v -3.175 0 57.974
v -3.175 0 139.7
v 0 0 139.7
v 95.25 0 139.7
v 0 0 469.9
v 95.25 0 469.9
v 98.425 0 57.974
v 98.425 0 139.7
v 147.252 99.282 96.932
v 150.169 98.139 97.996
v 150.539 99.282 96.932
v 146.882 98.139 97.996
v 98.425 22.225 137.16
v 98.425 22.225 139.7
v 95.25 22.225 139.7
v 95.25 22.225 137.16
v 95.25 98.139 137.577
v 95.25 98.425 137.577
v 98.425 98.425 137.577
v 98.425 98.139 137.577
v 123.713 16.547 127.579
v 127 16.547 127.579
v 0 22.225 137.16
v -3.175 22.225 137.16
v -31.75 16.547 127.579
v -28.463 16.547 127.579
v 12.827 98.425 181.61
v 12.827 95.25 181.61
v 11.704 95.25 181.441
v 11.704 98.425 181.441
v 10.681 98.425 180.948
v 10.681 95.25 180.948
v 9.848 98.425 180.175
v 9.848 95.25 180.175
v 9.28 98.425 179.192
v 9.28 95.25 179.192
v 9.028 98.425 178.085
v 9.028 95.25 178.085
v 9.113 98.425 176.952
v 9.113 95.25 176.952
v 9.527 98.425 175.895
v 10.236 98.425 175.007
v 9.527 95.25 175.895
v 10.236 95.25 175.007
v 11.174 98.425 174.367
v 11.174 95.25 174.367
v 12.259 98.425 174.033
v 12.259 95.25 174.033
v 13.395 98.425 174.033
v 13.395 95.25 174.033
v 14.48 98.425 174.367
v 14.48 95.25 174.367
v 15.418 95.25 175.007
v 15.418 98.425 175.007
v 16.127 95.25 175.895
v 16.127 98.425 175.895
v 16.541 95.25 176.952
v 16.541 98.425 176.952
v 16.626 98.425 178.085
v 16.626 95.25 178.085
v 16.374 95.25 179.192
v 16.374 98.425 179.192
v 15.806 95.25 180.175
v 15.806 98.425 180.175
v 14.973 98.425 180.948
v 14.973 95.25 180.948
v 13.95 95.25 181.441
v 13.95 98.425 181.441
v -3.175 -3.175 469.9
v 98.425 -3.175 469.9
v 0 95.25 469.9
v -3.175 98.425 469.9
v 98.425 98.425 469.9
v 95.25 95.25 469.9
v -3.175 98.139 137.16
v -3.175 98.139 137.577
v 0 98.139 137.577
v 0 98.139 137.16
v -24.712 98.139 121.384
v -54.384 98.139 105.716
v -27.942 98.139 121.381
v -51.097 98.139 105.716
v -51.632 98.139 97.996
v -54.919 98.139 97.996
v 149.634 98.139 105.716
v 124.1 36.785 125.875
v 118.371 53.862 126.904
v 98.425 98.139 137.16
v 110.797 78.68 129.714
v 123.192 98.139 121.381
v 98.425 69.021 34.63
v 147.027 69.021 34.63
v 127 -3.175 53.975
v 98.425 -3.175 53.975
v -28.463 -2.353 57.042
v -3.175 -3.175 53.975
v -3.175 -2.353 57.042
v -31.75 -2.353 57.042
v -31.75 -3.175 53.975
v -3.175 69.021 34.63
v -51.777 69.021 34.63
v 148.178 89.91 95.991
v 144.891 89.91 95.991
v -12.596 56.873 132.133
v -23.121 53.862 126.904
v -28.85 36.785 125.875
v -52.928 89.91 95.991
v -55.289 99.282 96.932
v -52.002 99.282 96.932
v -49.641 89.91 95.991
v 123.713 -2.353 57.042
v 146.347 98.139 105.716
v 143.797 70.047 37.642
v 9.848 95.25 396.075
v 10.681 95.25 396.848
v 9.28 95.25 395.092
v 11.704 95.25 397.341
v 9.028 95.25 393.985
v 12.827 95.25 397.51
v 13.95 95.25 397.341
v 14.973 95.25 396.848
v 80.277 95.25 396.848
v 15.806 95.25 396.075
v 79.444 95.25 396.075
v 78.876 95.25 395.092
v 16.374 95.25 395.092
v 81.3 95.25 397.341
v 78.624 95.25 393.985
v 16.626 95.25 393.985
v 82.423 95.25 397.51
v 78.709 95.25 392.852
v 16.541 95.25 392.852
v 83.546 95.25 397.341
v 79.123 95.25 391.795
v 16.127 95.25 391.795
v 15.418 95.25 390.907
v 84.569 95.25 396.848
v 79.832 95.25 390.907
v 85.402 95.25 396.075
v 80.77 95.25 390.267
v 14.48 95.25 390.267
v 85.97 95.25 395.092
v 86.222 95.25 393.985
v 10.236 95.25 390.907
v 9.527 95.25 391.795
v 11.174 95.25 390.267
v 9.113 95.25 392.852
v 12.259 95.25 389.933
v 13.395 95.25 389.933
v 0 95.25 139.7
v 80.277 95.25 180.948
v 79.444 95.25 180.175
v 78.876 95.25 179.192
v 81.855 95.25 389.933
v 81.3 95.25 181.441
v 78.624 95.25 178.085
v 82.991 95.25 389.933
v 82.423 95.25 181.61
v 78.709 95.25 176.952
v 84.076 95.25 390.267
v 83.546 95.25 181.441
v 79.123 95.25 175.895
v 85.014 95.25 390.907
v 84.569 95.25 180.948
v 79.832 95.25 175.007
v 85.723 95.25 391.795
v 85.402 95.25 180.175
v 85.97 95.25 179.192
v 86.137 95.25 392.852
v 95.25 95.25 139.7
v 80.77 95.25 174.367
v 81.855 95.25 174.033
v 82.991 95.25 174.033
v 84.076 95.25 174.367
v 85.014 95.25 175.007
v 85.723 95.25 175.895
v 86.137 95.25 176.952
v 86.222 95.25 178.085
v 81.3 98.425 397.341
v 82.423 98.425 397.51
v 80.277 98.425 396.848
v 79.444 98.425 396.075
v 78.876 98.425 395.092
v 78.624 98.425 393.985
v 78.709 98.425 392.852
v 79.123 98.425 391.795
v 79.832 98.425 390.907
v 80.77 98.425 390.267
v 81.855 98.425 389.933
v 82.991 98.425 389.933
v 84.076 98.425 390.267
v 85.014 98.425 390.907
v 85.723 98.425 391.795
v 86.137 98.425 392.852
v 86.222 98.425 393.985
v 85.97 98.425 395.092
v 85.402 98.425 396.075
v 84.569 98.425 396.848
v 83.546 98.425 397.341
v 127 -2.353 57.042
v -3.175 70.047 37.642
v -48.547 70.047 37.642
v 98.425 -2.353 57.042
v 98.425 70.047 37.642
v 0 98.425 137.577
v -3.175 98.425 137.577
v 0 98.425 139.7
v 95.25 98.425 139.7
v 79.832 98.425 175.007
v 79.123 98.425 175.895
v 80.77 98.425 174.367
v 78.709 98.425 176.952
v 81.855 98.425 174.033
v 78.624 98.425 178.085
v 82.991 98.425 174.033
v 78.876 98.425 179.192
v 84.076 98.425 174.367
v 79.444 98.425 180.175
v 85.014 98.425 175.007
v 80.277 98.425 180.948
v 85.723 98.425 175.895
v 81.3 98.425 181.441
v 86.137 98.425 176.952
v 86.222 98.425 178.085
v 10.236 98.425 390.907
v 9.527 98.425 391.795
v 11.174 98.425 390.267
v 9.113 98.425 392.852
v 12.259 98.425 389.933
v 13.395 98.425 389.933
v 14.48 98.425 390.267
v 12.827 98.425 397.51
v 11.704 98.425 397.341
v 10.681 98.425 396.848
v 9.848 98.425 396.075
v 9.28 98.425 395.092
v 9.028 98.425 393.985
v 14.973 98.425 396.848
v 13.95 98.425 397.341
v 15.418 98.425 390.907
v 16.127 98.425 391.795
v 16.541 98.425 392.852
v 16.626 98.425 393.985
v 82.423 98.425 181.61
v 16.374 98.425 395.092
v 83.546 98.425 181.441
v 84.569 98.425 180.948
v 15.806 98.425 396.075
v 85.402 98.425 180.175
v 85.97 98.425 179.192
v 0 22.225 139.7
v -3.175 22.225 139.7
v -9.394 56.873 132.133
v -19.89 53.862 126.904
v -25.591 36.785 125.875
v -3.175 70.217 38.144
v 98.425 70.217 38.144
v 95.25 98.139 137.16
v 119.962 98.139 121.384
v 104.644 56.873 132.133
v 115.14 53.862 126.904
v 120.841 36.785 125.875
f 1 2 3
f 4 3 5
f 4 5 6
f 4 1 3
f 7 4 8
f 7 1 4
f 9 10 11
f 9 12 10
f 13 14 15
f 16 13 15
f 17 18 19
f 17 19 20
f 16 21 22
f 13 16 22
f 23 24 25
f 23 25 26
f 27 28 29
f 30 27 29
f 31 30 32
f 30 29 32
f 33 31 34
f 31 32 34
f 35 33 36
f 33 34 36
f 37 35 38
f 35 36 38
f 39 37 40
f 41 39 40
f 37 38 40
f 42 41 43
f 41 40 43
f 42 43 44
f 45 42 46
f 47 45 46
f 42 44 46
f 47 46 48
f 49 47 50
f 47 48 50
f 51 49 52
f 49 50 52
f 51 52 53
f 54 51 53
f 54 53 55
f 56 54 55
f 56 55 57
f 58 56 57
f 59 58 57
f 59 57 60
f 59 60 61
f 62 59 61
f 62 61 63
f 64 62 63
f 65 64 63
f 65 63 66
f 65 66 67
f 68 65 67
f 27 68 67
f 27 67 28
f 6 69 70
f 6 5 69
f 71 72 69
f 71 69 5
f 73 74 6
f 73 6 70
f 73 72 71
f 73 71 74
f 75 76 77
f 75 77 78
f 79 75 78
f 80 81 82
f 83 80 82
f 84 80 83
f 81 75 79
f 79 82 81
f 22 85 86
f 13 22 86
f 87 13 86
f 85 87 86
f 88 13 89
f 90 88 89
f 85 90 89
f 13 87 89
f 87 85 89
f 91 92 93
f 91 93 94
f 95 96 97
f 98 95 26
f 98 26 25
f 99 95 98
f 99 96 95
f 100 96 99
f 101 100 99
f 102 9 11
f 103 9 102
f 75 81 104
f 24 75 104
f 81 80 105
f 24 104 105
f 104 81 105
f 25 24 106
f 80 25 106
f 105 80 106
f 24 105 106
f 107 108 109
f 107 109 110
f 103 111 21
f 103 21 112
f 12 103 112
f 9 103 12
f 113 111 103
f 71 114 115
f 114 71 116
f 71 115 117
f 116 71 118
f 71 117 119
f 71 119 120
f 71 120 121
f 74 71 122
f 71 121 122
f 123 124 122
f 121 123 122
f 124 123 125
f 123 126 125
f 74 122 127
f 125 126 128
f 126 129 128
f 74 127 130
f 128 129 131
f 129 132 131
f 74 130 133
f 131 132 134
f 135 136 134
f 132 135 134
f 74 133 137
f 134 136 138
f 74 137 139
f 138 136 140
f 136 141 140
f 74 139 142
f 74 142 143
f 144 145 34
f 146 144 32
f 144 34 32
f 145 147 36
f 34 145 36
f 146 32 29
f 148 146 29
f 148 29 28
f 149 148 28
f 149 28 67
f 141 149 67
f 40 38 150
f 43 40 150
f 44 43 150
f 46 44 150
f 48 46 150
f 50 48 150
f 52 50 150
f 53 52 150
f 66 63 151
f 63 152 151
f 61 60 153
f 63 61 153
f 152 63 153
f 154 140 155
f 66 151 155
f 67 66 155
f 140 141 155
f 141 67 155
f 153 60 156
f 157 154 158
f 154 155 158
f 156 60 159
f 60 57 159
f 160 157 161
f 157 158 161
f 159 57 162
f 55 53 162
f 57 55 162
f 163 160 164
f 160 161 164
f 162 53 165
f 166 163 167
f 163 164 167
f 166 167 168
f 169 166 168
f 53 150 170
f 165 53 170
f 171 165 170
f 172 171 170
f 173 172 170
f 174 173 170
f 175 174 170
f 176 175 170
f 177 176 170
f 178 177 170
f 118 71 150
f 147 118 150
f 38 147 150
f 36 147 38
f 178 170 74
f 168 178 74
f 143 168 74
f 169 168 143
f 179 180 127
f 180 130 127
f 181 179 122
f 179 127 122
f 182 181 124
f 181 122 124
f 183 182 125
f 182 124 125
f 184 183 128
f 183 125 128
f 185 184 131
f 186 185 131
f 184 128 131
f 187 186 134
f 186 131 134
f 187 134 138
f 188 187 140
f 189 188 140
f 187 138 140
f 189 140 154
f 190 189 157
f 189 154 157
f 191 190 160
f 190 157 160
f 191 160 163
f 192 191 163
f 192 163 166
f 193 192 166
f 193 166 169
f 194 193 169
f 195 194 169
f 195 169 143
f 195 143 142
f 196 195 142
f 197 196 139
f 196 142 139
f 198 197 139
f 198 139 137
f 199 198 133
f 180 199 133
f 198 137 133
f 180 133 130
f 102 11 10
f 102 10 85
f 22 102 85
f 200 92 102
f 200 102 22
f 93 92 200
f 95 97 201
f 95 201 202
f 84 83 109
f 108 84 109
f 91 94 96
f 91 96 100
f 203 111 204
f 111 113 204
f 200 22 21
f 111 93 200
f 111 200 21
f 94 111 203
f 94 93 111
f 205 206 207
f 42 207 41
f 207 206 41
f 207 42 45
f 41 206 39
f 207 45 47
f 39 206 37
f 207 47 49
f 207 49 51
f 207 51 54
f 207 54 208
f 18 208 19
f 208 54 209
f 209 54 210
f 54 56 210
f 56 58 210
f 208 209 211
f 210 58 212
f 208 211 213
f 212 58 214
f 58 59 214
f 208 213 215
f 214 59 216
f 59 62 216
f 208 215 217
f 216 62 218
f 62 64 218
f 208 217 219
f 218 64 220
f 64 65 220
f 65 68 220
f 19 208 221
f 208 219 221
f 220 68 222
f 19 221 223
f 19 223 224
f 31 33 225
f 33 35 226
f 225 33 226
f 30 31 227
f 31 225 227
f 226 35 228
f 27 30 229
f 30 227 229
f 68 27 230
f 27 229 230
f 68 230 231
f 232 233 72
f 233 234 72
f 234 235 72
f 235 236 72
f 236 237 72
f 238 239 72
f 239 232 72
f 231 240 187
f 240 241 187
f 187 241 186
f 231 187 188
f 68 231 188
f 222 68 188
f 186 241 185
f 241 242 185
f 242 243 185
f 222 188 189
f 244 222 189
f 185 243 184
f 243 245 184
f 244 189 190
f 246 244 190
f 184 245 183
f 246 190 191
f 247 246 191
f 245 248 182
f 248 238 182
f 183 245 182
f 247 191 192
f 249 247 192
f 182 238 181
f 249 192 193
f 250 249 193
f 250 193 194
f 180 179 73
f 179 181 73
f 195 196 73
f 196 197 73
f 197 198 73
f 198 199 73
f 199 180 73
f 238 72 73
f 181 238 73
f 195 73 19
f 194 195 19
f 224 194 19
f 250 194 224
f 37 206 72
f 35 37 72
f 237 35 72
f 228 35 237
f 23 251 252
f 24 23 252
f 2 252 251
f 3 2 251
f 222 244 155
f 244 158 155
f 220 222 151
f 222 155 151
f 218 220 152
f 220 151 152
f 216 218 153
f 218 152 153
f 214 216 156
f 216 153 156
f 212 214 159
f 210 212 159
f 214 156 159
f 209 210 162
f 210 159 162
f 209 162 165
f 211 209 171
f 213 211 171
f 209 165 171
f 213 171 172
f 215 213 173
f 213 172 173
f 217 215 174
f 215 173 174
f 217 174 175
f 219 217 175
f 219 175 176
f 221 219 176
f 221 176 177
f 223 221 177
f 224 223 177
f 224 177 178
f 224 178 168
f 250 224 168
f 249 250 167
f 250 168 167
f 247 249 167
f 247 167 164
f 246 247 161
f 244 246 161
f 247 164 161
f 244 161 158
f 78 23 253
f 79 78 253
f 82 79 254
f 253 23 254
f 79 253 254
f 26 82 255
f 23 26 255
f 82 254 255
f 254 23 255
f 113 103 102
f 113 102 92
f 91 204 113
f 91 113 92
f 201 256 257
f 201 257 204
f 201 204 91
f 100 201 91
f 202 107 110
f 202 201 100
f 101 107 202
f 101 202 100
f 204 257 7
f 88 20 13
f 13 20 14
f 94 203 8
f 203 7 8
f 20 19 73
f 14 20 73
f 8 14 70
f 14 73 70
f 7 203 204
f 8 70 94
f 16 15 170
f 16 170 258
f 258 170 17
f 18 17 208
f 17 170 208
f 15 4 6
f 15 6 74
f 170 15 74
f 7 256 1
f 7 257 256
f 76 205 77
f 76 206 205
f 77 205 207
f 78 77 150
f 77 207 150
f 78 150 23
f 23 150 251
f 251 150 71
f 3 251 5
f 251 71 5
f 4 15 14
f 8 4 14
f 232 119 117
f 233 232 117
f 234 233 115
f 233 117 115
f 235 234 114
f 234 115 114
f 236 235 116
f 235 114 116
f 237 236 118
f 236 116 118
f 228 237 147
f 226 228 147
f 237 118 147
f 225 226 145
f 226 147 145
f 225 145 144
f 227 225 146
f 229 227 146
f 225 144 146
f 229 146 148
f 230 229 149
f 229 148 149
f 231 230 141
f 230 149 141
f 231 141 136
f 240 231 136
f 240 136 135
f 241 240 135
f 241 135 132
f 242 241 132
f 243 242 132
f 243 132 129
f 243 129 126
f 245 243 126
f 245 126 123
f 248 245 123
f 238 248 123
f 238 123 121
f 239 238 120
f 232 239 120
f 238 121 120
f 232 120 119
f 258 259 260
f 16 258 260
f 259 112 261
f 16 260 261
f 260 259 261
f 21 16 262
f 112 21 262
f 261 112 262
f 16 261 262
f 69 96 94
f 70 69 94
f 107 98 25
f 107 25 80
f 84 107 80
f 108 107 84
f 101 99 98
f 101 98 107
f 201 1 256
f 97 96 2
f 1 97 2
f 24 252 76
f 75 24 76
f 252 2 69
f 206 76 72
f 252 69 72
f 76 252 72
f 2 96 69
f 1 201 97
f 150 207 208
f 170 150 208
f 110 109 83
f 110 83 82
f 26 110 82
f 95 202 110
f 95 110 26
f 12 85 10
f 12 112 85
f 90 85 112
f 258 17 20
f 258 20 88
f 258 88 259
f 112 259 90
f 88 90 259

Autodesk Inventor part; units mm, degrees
sketch "Sketch1" plane through (0, 0, 0) normal (0, 0, 1) x (1, 0, 0)
  line L0 (0, 0) -> (95.25, 0)
  line L1 (95.25, 0) -> (95.25, 95.25)
  line L2 (95.25, 95.25) -> (0, 95.25)
  line L3 (0, 95.25) -> (0, 0)
  line L4 (-3.175, -3.175) -> (98.425, -3.175)
  line L5 (98.425, -3.175) -> (98.425, 98.425)
  line L6 (98.425, 98.425) -> (-3.175, 98.425)
  line L7 (-3.175, 98.425) -> (-3.175, -3.175)
  dimension "d0" = 95.25
  dimension "d1" = 95.25
  dimension "d2" = 3.175
sketch "Sketch1 outline for Extrusion1" plane through (0, 0, 0) normal (0, 0, 1) x (1, 0, 0)
  line L0 (-3.175, 98.425) -> (-3.175, -3.175)
  line L1 (98.425, 98.425) -> (-3.175, 98.425)
  line L2 (-3.175, -3.175) -> (98.425, -3.175)
  line L3 (98.425, -3.175) -> (98.425, 98.425)
  line L4 (0, 95.25) -> (0, 0)
  line L5 (0, 0) -> (95.25, 0)
  line L6 (95.25, 0) -> (95.25, 95.25)
  line L7 (95.25, 95.25) -> (0, 95.25)
extrude "Extrusion1" add sketch "Sketch1 outline for Extrusion1" along normal blind 406.4
sketch "Sketch3" plane through (0, 0, 0) normal (0, 0, -1) x (-1, 0, 0)
  line L0 (0, 95.25) -> (0, 0) projected
  line L1 (0, 0) -> (-95.25, 0) projected
  line L2 (-95.25, 0) -> (-95.25, 95.25) projected
  line L3 (-95.25, 95.25) -> (0, 95.25) projected
  line L4 (3.175, -3.175) -> (-98.425, -3.175) projected
  line L5 (3.175, 98.425) -> (3.175, -3.175) projected
  line L6 (-98.425, 98.425) -> (3.175, 98.425) projected
  line L7 (-98.425, -3.175) -> (-98.425, 98.425) projected
sketch "Sketch3 outline for Extrusion2" plane through (0, 0, 0) normal (0, 0, -1) x (-1, 0, 0)
  line L0 (-98.425, 98.425) -> (-98.425, -3.175)
  line L1 (3.175, 98.425) -> (-98.425, 98.425)
  line L2 (-98.425, -3.175) -> (3.175, -3.175)
  line L3 (3.175, -3.175) -> (3.175, 98.425)
  line L4 (-95.25, 95.25) -> (0, 95.25)
  line L5 (-95.25, 0) -> (-95.25, 95.25)
  line L6 (0, 0) -> (-95.25, 0)
  line L7 (0, 95.25) -> (0, 0)
extrude "Extrusion2" cut sketch "Sketch3 outline for Extrusion2" against normal blind 50.8
sketch "Sketch4" plane through (-3.175, 98.425, 406.4) normal (0, 1, 0) x (1, 0, 0)
  line L0 (101.6, 355.6) -> (0, 355.6) projected
  line L1 (0, 355.6) -> (0, 0) projected
  line L2 (101.6, 355.6) -> (0, 355.6)
  line L3 (0, 355.6) -> (0, 266.7)
  line L4 (0, 266.7) -> (101.6, 266.7)
  line L5 (101.6, 266.7) -> (101.6, 355.6)
  point P0 (3.175, 406.4)
  dimension "d7" = 88.9
sketch "Sketch4 outline for Extrusion3" plane through (-3.175, 98.425, 406.4) normal (0, 1, 0) x (1, 0, 0)
  line L0 (101.6, 266.7) -> (101.6, 355.6)
  line L1 (0, 266.7) -> (101.6, 266.7)
  line L2 (0, 355.6) -> (0, 266.7)
  line L3 (101.6, 355.6) -> (0, 355.6)
extrude "Extrusion3" cut sketch "Sketch4 outline for Extrusion3" against normal blind 98.425
sketch "Sketch5" plane through (0, 0, 50.8) normal (0, 0, -1) x (-1, 0, 0)
  line L0 (3.175, 0) -> (-98.425, 0)
  line L1 (-98.425, -3.175) -> (-98.425, 0)
  line L2 (3.175, 0) -> (3.175, -3.175)
  line L3 (3.175, -3.175) -> (55.29887, 140.034155)
  line L4 (3.175, -3.175) -> (155.575, -3.175) construction
  line L5 (-98.425, -3.175) -> (-150.54887, 140.034155)
  line L6 (-98.425, -3.175) -> (53.975, -3.175) construction
  line L7 (-98.425, -3.175) -> (3.175, -3.175)
  line L8 (-98.425, 98.425) -> (40.154376, 98.425)
  line L9 (-98.425, 98.425) -> (-135.404376, 98.425)
  point P0 (0, 0)
  dimension "d10" = 152.4
  dimension "d11" = 70
  dimension "d12" = 152.4
  dimension "d13" = 110
  dimension "d14" = 101.6
sketch "Sketch5 outline for Extrusion4" plane through (0, 0, 50.8) normal (0, 0, -1) x (-1, 0, 0)
  line L0 (-98.425, 0) -> (3.175, 0)
  line L1 (-98.425, -3.175) -> (-98.425, 0)
  line L2 (-135.404376, 98.425) -> (-98.425, -3.175)
  line L3 (-98.425, 98.425) -> (-135.404376, 98.425)
  line L4 (40.154376, 98.425) -> (-98.425, 98.425)
  line L5 (3.175, -3.175) -> (40.154376, 98.425)
  line L6 (3.175, 0) -> (3.175, -3.175)
extrude "Extrusion4" add sketch "Sketch5 outline for Extrusion4" against normal blind 3.175
sketch "Sketch6" plane through (0, 0, 53.975) normal (0, 0, 1) x (1, 0, 0)
  line L0 (-3.175, -3.175) -> (-40.154376, 98.425)
  line L1 (135.404376, 98.425) -> (98.425, -3.175)
  line L2 (-40.154376, 98.425) -> (135.404376, 98.425)
  line L3 (98.425, -3.175) -> (135.404376, 98.425)
  line L4 (-40.154376, 98.425) -> (-3.175, -3.175)
  line L5 (-3.175, -3.175) -> (98.425, -3.175)
  line L6 (130.870006, 95.25) -> (96.201841, 0)
  line L7 (96.201841, 0) -> (-0.951841, 0)
  line L8 (-0.951841, 0) -> (-35.620006, 95.25)
  line L9 (130.870006, 95.25) -> (132.025611, 98.425)
  line L10 (98.964652, 7.590761) -> (101.948176, 6.504847)
  line L11 (-3.714652, 7.590761) -> (-6.698176, 6.504847)
  line L12 (-35.620006, 95.25) -> (-36.775611, 98.425)
  line L13 (135.404376, 98.425) -> (132.025611, 98.425)
  line L14 (-36.775611, 98.425) -> (-40.154376, 98.425)
  point P0 (0, 0)
sketch "Sketch6 outline for Extrusion5" plane through (0, 0, 53.975) normal (0, 0, 1) x (1, 0, 0)
  line L0 (101.948176, 6.504847) -> (135.404376, 98.425)
  line L1 (135.404376, 98.425) -> (132.025611, 98.425)
  line L2 (132.025611, 98.425) -> (98.964652, 7.590761)
  line L3 (98.964652, 7.590761) -> (101.948176, 6.504847)
  line L4 (-36.775611, 98.425) -> (-40.154376, 98.425)
  line L5 (-40.154376, 98.425) -> (-6.698176, 6.504847)
  line L6 (-6.698176, 6.504847) -> (-3.714652, 7.590761)
  line L7 (-3.714652, 7.590761) -> (-36.775611, 98.425)
extrude "Extrusion5" add sketch "Sketch6 outline for Extrusion5" along normal blind 82.55
sketch "Sketch7" plane through (0, 0, 406.4) normal (0, 0, 1) x (1, 0, 0)
  line L0 (0, 0) -> (0, 95.25) projected
  line L1 (0, 95.25) -> (95.25, 95.25) projected
  line L2 (95.25, 95.25) -> (95.25, 0) projected
  line L3 (95.25, 0) -> (0, 0) projected
  line L4 (-3.175, -3.175) -> (-3.175, 98.425) projected
  line L5 (98.425, -3.175) -> (-3.175, -3.175) projected
  line L6 (98.425, 98.425) -> (98.425, -3.175) projected
  line L7 (-3.175, 98.425) -> (98.425, 98.425) projected
sketch "Sketch7 outline for Extrusion6" plane through (0, 0, 406.4) normal (0, 0, 1) x (1, 0, 0)
  line L0 (98.425, 98.425) -> (-3.175, 98.425)
  line L1 (98.425, -3.175) -> (98.425, 98.425)
  line L2 (-3.175, 98.425) -> (-3.175, -3.175)
  line L3 (-3.175, -3.175) -> (98.425, -3.175)
  line L4 (95.25, 0) -> (0, 0)
  line L5 (95.25, 95.25) -> (95.25, 0)
  line L6 (0, 95.25) -> (95.25, 95.25)
  line L7 (0, 0) -> (0, 95.25)
extrude "Extrusion6" add sketch "Sketch7 outline for Extrusion6" along normal blind 88.9
ref_plane "Work Plane1" through (47.625, 0, 139.7) normal (-1, 0, 0) x (0, 0, 1)
sketch "Sketch8" plane through (98.425, 0, 139.7) normal (1, 0, 0) x (0, 0, -1)
  line L0 (85.725, -3.175) -> (-355.6, -3.175)
  line L1 (209.478818, 0) -> (209.478818, 140.094792)
  line L2 (209.478818, 140.094792) -> (0, 140.094792)
  line L3 (0, 140.094792) -> (0, 0)
  line L4 (0, 0) -> (209.478818, 0)
  point P0 (139.7, 0)
  point P1 (0, -3.175)
sketch "Sketch8 outline for Extrusion7" plane through (98.425, 0, 139.7) normal (1, 0, 0) x (0, 0, -1)
  line L0 (209.478818, 140.094792) -> (209.478818, 0)
  line L1 (209.478818, 0) -> (0, 0)
  line L2 (0, 0) -> (0, 140.094792)
  line L3 (0, 140.094792) -> (209.478818, 140.094792)
extrude "Extrusion7" cut sketch "Sketch8 outline for Extrusion7" along normal through all both and the other way through all
sketch "Sketch9" plane through (0, 0, 495.3) normal (0, 0, 1) x (1, 0, 0)
  line L0 (0, 95.25) -> (95.25, 95.25) projected
  line L1 (95.25, 95.25) -> (95.25, 0) projected
  line L2 (95.25, 0) -> (0, 0) projected
  line L3 (0, 0) -> (0, 95.25) projected
  line L4 (-3.175, 98.425) -> (98.425, 98.425) projected
  line L5 (-3.175, -3.175) -> (-3.175, 98.425) projected
  line L6 (98.425, -3.175) -> (-3.175, -3.175) projected
  line L7 (98.425, 98.425) -> (98.425, -3.175) projected
sketch "Sketch9 outline for Extrusion8" plane through (0, 0, 495.3) normal (0, 0, 1) x (1, 0, 0)
  line L0 (98.425, -3.175) -> (98.425, 98.425)
  line L1 (-3.175, -3.175) -> (98.425, -3.175)
  line L2 (98.425, 98.425) -> (-3.175, 98.425)
  line L3 (-3.175, 98.425) -> (-3.175, -3.175)
  line L4 (0, 0) -> (0, 95.25)
  line L5 (95.25, 0) -> (0, 0)
  line L6 (95.25, 95.25) -> (95.25, 0)
  line L7 (0, 95.25) -> (95.25, 95.25)
extrude "Extrusion8" cut sketch "Sketch9 outline for Extrusion8" against normal blind 25.4
ref_plane "Work Plane3" through (99.580605, 0, 53.975) normal (1, 0, 0) x (0, 0, -1)
sketch "Sketch11" plane through (99.580605, 0, 53.975) normal (1, 0, 0) x (0, 0, -1)
  line L0 (0, 0) -> (4.92371, 0)
  line L1 (4.92371, 0) -> (4.92371, -5.872358)
  line L2 (4.92371, -5.872358) -> (0, -5.872358)
  line L3 (0, -5.872358) -> (0, 0)
  point P0 (53.975, 0)
sketch "Sketch11 outline for Extrusion9" plane through (99.580605, 0, 53.975) normal (1, 0, 0) x (0, 0, -1)
  line L0 (0, 0) -> (4.92371, 0)
  line L1 (4.92371, 0) -> (4.92371, -5.872358)
  line L2 (4.92371, -5.872358) -> (0, -5.872358)
  line L3 (0, -5.872358) -> (0, 0)
extrude "Extrusion9" cut sketch "Sketch11 outline for Extrusion9" against normal through all
sketch "Sketch12" plane through (98.425, 0, 139.7) normal (1, 0, 0) x (0, 0, -1)
  line L0 (85.725, -3.175) -> (85.725, 0)
  line L1 (85.725, 0) -> (0, 0)
  line L2 (85.725, -3.175) -> (115.308017, 107.230322)
  line L3 (85.725, -3.175) -> (200.025, -3.175) construction
  line L4 (115.308017, 107.230322) -> (112.241202, 108.052072)
  line L5 (112.241202, 108.052072) -> (81.725693, 0)
  line L6 (81.725693, 0) -> (85.725, -3.175)
  point P0 (139.7, 0)
  dimension "d29" = 114.3
  dimension "d30" = 75
  dimension "d31" = 3.175
sketch "Sketch12 outline for Extrusion10" plane through (98.425, 0, 139.7) normal (1, 0, 0) x (0, 0, -1)
  line L0 (85.725, 0) -> (85.725, -3.175)
  line L1 (81.725693, 0) -> (85.725, 0)
  line L2 (112.241202, 108.052072) -> (81.725693, 0)
  line L3 (115.308017, 107.230322) -> (112.241202, 108.052072)
  line L4 (85.725, -3.175) -> (115.308017, 107.230322)
extrude "Extrusion10" add sketch "Sketch12 outline for Extrusion10" against normal blind 101.6
sketch "Sketch13" plane through (98.425, 107.230322, 24.391983) normal (0, -0.258819, -0.9659258) x (-1, 0, 0)
  line L0 (101.6, -114.3) -> (101.6, 0)
  line L1 (0, 0) -> (101.6, 0)
  line L2 (0, -114.3) -> (0, 0)
  line L3 (101.6, -114.3) -> (0, -114.3)
  line L4 (0, -114.3) -> (101.6, -114.3)
  line L5 (101.6, -114.3) -> (130.175, -114.3)
  line L6 (130.175, -114.3) -> (160.801593, 0)
  line L7 (0, -114.3) -> (-28.575, -114.3)
  line L8 (-28.575, -114.3) -> (-59.201593, 0)
  line L9 (160.801593, 0) -> (-59.201593, 0)
  point P0 (98.425, -97.263428)
  dimension "d34" = 28.575
  dimension "d35" = 105
  dimension "d36" = 28.575
  dimension "d37" = 105
  dimension "d40" = 114.3
sketch "Sketch13 outline for Extrusion11" plane through (98.425, 107.230322, 24.391983) normal (0, -0.258819, -0.9659258) x (-1, 0, 0)
  line L0 (-28.575, -114.3) -> (0, -114.3)
  line L1 (-59.201593, 0) -> (-28.575, -114.3)
  line L2 (0, 0) -> (-59.201593, 0)
  line L3 (0, 0) -> (0, -114.3)
  line L4 (101.6, -114.3) -> (101.6, 0)
  line L5 (160.801593, 0) -> (101.6, 0)
  line L6 (130.175, -114.3) -> (160.801593, 0)
  line L7 (101.6, -114.3) -> (130.175, -114.3)
extrude "Extrusion11" add sketch "Sketch13 outline for Extrusion11" against normal blind 3.175
sketch "Sketch14" plane through (127, -3.175, 53.975) normal (0, -0.258819, -0.9659258) x (-1, 0, 0)
  line L0 (189.376593, 114.3) -> (-30.626593, 114.3)
  line L1 (-30.626593, 114.3) -> (0, 0)
  line L2 (130.175, 0) -> (158.75, 0)
  line L3 (158.75, 0) -> (189.376593, 114.3)
  line L4 (-30.626593, 114.3) -> (0, 0)
  line L5 (0, 0) -> (158.75, 0)
  line L6 (158.75, 0) -> (189.376593, 114.3)
  line L7 (186.309778, 115.12175) -> (156.313737, 3.175)
  line L8 (156.313737, 3.175) -> (2.436263, 3.175)
  line L9 (2.436263, 3.175) -> (-27.559778, 115.12175)
  line L10 (-30.626593, 114.3) -> (-27.339591, 114.3)
  line L11 (189.376593, 114.3) -> (186.089591, 114.3)
  line L12 (0, 0) -> (28.575, 0)
  line L13 (156.313737, 3.175) -> (155.462998, 0)
  line L14 (2.436263, 3.175) -> (3.287002, 0)
  point P0 (127, 17.036572)
  dimension "d41" = 3.175
sketch "Sketch14 outline for Extrusion12" plane through (127, -3.175, 53.975) normal (0, -0.258819, -0.9659258) x (-1, 0, 0)
  line L0 (158.75, 0) -> (189.376593, 114.3)
  line L1 (189.376593, 114.3) -> (186.089591, 114.3)
  line L2 (186.089591, 114.3) -> (155.462998, 0)
  line L3 (155.462998, 0) -> (158.75, 0)
  line L4 (-27.339591, 114.3) -> (-30.626593, 114.3)
  line L5 (-30.626593, 114.3) -> (0, 0)
  line L6 (0, 0) -> (3.287002, 0)
  line L7 (3.287002, 0) -> (-27.339591, 114.3)
extrude "Extrusion12" add sketch "Sketch14 outline for Extrusion12" against normal blind 76.2
sketch "Sketch15" plane through (98.425, 98.425, 139.7) normal (0, 0, -1) x (-1, 0, 0)
  line L0 (3.175, -3.175) -> (3.175, -98.425) projected
  line L1 (0, 0) -> (3.175, 0)
  line L2 (3.175, 0) -> (3.175, -76.2)
  line L3 (3.175, -76.2) -> (0, -76.2)
  line L4 (0, -76.2) -> (0, 0)
  dimension "d44" = 76.2
sketch "Sketch15 outline for Extrusion13" plane through (98.425, 98.425, 139.7) normal (0, 0, -1) x (-1, 0, 0)
  line L0 (3.175, 0) -> (0, 0)
  line L1 (3.175, -76.2) -> (3.175, 0)
  line L2 (0, -76.2) -> (3.175, -76.2)
  line L3 (0, 0) -> (0, -76.2)
extrude "Extrusion13" add sketch "Sketch15 outline for Extrusion13" along normal blind 2.54
loft "Loft1" add section 1 edges at (96.8375, 98.425, 137.16) (98.425, 60.325, 137.16) (96.8375, 22.225, 137.16) (95.25, 60.325, 137.16) section 2 edges at (125.356499, 16.547011, 127.578548) (142.313296, 71.749672, 112.78704) (155.983092, 126.952333, 97.995531) (139.026294, 71.749672, 112.78704)
sketch "Sketch16" plane through (95.25, 98.425, 139.7) normal (0, 0, -1) x (-1, 0, 0)
  line L0 (95.25, -98.425) -> (95.25, -3.175) projected
  line L1 (98.425, 0) -> (95.25, 0)
  line L2 (95.25, 0) -> (95.25, -76.2)
  line L3 (95.25, -76.2) -> (98.425, -76.2)
  line L4 (98.425, -76.2) -> (98.425, 0)
  dimension "d51" = 76.2
sketch "Sketch16 outline for Extrusion14" plane through (95.25, 98.425, 139.7) normal (0, 0, -1) x (-1, 0, 0)
  line L0 (95.25, 0) -> (95.25, -76.2)
  line L1 (98.425, 0) -> (95.25, 0)
  line L2 (98.425, -76.2) -> (98.425, 0)
  line L3 (95.25, -76.2) -> (98.425, -76.2)
extrude "Extrusion14" add sketch "Sketch16 outline for Extrusion14" along normal blind 2.54
loft "Loft2" add section 1 edges at (0, 60.325, 137.16) (-1.5875, 22.225, 137.16) (-3.175, 60.325, 137.16) (-1.5875, 98.425, 137.16) section 2 edges at (-43.776294, 71.749672, 112.78704) (-60.733092, 126.952333, 97.995531) (-47.063296, 71.749672, 112.78704) (-30.106499, 16.547011, 127.578548)
ref_plane "Work Plane4" through (-62.376593, 126.952333, 97.995531) normal (-1, 0, 0) x (0, 0, 1)
sketch "Sketch17" plane through (-62.376593, 126.952333, 97.995531) normal (-1, 0, 0) x (0, 0, 1)
  line L0 (0, 0) -> (39.581959, 0)
  line L1 (39.581959, 0) -> (39.581959, -28.813692)
  line L2 (39.581959, -28.813692) -> (0, -28.813692)
  line L3 (0, -28.813692) -> (-21.532096, -5.667761)
  line L4 (-21.532096, -5.667761) -> (0, 0)
  point P0 (-97.995531, -126.952333)
sketch "Sketch17 outline for Extrusion15" plane through (-62.376593, 126.952333, 97.995531) normal (-1, 0, 0) x (0, 0, 1)
  line L0 (0, 0) -> (39.581959, 0)
  line L1 (39.581959, 0) -> (39.581959, -28.813692)
  line L2 (39.581959, -28.813692) -> (0, -28.813692)
  line L3 (0, -28.813692) -> (-21.532096, -5.667761)
  line L4 (-21.532096, -5.667761) -> (0, 0)
extrude "Extrusion15" cut sketch "Sketch17 outline for Extrusion15" against normal through all
ref_plane "Work Plane5" through (-62.376593, 121.203127, 76.539202) normal (-1, 0, 0) x (0, 0, 1)
sketch "Sketch18" plane through (-62.376593, 121.203127, 76.539202) normal (-1, 0, 0) x (0, 0, 1)
  line L0 (19.452148, -31.292775) -> (-58.109978, -57.697076)
  line L1 (19.452148, -31.292775) -> (24.815614, 22.153396)
  line L2 (24.815614, 22.153396) -> (-54.454563, 58.685988)
  line L3 (-58.109978, -57.697076) -> (-54.454563, 58.685988)
  point P0 (-76.539202, -121.203127)
sketch "Sketch18 outline for Extrusion16" plane through (-62.376593, 121.203127, 76.539202) normal (-1, 0, 0) x (0, 0, 1)
  line L0 (19.452148, -31.292775) -> (-58.109978, -57.697076)
  line L1 (-58.109978, -57.697076) -> (-54.454563, 58.685988)
  line L2 (-54.454563, 58.685988) -> (24.815614, 22.153396)
  line L3 (24.815614, 22.153396) -> (19.452148, -31.292775)
extrude "Extrusion16" cut sketch "Sketch18 outline for Extrusion16" against normal through all
sketch "Sketch19" plane through (0, 98.425, 139.7) normal (0, 1, 0) x (1, 0, 0)
  line L0 (-3.175, 2.12251) -> (-3.175, -330.2)
  line L1 (-3.175, -330.2) -> (98.425, -330.2)
  line L2 (98.425, 2.12251) -> (98.425, -330.2)
  line L3 (95.25, 0) -> (0, 0)
  line L4 (-3.175, 0) -> (12.827, 0)
  line L5 (12.827, 0) -> (12.827, -38.1)
  line L6 (98.425, 0) -> (82.423, 0)
  line L7 (82.423, 0) -> (82.423, -38.1)
  line L8 (-3.175, -330.2) -> (12.827, -330.2)
  line L9 (98.425, -330.2) -> (82.423, -330.2)
  line L10 (82.423, -330.2) -> (82.423, -254)
  line L11 (12.827, -330.2) -> (12.827, -254)
  point P0 (0, 139.7)
  dimension "d62" = 16.002
  dimension "d63" = 38.1
  dimension "d64" = 16.002
  dimension "d65" = 76.2
  dimension "d66" = 76.2
hole "Hole1" at (12.827, 98.425, 177.8) at (82.423, 98.425, 177.8) at (12.827, 98.425, 393.7) at (82.423, 98.425, 393.7) direction (0, -1, 0) diameter 7.62 depth 25.4 tip angle 118
equation "\"d0\" = d1"
properties part number "Ball Collector"
